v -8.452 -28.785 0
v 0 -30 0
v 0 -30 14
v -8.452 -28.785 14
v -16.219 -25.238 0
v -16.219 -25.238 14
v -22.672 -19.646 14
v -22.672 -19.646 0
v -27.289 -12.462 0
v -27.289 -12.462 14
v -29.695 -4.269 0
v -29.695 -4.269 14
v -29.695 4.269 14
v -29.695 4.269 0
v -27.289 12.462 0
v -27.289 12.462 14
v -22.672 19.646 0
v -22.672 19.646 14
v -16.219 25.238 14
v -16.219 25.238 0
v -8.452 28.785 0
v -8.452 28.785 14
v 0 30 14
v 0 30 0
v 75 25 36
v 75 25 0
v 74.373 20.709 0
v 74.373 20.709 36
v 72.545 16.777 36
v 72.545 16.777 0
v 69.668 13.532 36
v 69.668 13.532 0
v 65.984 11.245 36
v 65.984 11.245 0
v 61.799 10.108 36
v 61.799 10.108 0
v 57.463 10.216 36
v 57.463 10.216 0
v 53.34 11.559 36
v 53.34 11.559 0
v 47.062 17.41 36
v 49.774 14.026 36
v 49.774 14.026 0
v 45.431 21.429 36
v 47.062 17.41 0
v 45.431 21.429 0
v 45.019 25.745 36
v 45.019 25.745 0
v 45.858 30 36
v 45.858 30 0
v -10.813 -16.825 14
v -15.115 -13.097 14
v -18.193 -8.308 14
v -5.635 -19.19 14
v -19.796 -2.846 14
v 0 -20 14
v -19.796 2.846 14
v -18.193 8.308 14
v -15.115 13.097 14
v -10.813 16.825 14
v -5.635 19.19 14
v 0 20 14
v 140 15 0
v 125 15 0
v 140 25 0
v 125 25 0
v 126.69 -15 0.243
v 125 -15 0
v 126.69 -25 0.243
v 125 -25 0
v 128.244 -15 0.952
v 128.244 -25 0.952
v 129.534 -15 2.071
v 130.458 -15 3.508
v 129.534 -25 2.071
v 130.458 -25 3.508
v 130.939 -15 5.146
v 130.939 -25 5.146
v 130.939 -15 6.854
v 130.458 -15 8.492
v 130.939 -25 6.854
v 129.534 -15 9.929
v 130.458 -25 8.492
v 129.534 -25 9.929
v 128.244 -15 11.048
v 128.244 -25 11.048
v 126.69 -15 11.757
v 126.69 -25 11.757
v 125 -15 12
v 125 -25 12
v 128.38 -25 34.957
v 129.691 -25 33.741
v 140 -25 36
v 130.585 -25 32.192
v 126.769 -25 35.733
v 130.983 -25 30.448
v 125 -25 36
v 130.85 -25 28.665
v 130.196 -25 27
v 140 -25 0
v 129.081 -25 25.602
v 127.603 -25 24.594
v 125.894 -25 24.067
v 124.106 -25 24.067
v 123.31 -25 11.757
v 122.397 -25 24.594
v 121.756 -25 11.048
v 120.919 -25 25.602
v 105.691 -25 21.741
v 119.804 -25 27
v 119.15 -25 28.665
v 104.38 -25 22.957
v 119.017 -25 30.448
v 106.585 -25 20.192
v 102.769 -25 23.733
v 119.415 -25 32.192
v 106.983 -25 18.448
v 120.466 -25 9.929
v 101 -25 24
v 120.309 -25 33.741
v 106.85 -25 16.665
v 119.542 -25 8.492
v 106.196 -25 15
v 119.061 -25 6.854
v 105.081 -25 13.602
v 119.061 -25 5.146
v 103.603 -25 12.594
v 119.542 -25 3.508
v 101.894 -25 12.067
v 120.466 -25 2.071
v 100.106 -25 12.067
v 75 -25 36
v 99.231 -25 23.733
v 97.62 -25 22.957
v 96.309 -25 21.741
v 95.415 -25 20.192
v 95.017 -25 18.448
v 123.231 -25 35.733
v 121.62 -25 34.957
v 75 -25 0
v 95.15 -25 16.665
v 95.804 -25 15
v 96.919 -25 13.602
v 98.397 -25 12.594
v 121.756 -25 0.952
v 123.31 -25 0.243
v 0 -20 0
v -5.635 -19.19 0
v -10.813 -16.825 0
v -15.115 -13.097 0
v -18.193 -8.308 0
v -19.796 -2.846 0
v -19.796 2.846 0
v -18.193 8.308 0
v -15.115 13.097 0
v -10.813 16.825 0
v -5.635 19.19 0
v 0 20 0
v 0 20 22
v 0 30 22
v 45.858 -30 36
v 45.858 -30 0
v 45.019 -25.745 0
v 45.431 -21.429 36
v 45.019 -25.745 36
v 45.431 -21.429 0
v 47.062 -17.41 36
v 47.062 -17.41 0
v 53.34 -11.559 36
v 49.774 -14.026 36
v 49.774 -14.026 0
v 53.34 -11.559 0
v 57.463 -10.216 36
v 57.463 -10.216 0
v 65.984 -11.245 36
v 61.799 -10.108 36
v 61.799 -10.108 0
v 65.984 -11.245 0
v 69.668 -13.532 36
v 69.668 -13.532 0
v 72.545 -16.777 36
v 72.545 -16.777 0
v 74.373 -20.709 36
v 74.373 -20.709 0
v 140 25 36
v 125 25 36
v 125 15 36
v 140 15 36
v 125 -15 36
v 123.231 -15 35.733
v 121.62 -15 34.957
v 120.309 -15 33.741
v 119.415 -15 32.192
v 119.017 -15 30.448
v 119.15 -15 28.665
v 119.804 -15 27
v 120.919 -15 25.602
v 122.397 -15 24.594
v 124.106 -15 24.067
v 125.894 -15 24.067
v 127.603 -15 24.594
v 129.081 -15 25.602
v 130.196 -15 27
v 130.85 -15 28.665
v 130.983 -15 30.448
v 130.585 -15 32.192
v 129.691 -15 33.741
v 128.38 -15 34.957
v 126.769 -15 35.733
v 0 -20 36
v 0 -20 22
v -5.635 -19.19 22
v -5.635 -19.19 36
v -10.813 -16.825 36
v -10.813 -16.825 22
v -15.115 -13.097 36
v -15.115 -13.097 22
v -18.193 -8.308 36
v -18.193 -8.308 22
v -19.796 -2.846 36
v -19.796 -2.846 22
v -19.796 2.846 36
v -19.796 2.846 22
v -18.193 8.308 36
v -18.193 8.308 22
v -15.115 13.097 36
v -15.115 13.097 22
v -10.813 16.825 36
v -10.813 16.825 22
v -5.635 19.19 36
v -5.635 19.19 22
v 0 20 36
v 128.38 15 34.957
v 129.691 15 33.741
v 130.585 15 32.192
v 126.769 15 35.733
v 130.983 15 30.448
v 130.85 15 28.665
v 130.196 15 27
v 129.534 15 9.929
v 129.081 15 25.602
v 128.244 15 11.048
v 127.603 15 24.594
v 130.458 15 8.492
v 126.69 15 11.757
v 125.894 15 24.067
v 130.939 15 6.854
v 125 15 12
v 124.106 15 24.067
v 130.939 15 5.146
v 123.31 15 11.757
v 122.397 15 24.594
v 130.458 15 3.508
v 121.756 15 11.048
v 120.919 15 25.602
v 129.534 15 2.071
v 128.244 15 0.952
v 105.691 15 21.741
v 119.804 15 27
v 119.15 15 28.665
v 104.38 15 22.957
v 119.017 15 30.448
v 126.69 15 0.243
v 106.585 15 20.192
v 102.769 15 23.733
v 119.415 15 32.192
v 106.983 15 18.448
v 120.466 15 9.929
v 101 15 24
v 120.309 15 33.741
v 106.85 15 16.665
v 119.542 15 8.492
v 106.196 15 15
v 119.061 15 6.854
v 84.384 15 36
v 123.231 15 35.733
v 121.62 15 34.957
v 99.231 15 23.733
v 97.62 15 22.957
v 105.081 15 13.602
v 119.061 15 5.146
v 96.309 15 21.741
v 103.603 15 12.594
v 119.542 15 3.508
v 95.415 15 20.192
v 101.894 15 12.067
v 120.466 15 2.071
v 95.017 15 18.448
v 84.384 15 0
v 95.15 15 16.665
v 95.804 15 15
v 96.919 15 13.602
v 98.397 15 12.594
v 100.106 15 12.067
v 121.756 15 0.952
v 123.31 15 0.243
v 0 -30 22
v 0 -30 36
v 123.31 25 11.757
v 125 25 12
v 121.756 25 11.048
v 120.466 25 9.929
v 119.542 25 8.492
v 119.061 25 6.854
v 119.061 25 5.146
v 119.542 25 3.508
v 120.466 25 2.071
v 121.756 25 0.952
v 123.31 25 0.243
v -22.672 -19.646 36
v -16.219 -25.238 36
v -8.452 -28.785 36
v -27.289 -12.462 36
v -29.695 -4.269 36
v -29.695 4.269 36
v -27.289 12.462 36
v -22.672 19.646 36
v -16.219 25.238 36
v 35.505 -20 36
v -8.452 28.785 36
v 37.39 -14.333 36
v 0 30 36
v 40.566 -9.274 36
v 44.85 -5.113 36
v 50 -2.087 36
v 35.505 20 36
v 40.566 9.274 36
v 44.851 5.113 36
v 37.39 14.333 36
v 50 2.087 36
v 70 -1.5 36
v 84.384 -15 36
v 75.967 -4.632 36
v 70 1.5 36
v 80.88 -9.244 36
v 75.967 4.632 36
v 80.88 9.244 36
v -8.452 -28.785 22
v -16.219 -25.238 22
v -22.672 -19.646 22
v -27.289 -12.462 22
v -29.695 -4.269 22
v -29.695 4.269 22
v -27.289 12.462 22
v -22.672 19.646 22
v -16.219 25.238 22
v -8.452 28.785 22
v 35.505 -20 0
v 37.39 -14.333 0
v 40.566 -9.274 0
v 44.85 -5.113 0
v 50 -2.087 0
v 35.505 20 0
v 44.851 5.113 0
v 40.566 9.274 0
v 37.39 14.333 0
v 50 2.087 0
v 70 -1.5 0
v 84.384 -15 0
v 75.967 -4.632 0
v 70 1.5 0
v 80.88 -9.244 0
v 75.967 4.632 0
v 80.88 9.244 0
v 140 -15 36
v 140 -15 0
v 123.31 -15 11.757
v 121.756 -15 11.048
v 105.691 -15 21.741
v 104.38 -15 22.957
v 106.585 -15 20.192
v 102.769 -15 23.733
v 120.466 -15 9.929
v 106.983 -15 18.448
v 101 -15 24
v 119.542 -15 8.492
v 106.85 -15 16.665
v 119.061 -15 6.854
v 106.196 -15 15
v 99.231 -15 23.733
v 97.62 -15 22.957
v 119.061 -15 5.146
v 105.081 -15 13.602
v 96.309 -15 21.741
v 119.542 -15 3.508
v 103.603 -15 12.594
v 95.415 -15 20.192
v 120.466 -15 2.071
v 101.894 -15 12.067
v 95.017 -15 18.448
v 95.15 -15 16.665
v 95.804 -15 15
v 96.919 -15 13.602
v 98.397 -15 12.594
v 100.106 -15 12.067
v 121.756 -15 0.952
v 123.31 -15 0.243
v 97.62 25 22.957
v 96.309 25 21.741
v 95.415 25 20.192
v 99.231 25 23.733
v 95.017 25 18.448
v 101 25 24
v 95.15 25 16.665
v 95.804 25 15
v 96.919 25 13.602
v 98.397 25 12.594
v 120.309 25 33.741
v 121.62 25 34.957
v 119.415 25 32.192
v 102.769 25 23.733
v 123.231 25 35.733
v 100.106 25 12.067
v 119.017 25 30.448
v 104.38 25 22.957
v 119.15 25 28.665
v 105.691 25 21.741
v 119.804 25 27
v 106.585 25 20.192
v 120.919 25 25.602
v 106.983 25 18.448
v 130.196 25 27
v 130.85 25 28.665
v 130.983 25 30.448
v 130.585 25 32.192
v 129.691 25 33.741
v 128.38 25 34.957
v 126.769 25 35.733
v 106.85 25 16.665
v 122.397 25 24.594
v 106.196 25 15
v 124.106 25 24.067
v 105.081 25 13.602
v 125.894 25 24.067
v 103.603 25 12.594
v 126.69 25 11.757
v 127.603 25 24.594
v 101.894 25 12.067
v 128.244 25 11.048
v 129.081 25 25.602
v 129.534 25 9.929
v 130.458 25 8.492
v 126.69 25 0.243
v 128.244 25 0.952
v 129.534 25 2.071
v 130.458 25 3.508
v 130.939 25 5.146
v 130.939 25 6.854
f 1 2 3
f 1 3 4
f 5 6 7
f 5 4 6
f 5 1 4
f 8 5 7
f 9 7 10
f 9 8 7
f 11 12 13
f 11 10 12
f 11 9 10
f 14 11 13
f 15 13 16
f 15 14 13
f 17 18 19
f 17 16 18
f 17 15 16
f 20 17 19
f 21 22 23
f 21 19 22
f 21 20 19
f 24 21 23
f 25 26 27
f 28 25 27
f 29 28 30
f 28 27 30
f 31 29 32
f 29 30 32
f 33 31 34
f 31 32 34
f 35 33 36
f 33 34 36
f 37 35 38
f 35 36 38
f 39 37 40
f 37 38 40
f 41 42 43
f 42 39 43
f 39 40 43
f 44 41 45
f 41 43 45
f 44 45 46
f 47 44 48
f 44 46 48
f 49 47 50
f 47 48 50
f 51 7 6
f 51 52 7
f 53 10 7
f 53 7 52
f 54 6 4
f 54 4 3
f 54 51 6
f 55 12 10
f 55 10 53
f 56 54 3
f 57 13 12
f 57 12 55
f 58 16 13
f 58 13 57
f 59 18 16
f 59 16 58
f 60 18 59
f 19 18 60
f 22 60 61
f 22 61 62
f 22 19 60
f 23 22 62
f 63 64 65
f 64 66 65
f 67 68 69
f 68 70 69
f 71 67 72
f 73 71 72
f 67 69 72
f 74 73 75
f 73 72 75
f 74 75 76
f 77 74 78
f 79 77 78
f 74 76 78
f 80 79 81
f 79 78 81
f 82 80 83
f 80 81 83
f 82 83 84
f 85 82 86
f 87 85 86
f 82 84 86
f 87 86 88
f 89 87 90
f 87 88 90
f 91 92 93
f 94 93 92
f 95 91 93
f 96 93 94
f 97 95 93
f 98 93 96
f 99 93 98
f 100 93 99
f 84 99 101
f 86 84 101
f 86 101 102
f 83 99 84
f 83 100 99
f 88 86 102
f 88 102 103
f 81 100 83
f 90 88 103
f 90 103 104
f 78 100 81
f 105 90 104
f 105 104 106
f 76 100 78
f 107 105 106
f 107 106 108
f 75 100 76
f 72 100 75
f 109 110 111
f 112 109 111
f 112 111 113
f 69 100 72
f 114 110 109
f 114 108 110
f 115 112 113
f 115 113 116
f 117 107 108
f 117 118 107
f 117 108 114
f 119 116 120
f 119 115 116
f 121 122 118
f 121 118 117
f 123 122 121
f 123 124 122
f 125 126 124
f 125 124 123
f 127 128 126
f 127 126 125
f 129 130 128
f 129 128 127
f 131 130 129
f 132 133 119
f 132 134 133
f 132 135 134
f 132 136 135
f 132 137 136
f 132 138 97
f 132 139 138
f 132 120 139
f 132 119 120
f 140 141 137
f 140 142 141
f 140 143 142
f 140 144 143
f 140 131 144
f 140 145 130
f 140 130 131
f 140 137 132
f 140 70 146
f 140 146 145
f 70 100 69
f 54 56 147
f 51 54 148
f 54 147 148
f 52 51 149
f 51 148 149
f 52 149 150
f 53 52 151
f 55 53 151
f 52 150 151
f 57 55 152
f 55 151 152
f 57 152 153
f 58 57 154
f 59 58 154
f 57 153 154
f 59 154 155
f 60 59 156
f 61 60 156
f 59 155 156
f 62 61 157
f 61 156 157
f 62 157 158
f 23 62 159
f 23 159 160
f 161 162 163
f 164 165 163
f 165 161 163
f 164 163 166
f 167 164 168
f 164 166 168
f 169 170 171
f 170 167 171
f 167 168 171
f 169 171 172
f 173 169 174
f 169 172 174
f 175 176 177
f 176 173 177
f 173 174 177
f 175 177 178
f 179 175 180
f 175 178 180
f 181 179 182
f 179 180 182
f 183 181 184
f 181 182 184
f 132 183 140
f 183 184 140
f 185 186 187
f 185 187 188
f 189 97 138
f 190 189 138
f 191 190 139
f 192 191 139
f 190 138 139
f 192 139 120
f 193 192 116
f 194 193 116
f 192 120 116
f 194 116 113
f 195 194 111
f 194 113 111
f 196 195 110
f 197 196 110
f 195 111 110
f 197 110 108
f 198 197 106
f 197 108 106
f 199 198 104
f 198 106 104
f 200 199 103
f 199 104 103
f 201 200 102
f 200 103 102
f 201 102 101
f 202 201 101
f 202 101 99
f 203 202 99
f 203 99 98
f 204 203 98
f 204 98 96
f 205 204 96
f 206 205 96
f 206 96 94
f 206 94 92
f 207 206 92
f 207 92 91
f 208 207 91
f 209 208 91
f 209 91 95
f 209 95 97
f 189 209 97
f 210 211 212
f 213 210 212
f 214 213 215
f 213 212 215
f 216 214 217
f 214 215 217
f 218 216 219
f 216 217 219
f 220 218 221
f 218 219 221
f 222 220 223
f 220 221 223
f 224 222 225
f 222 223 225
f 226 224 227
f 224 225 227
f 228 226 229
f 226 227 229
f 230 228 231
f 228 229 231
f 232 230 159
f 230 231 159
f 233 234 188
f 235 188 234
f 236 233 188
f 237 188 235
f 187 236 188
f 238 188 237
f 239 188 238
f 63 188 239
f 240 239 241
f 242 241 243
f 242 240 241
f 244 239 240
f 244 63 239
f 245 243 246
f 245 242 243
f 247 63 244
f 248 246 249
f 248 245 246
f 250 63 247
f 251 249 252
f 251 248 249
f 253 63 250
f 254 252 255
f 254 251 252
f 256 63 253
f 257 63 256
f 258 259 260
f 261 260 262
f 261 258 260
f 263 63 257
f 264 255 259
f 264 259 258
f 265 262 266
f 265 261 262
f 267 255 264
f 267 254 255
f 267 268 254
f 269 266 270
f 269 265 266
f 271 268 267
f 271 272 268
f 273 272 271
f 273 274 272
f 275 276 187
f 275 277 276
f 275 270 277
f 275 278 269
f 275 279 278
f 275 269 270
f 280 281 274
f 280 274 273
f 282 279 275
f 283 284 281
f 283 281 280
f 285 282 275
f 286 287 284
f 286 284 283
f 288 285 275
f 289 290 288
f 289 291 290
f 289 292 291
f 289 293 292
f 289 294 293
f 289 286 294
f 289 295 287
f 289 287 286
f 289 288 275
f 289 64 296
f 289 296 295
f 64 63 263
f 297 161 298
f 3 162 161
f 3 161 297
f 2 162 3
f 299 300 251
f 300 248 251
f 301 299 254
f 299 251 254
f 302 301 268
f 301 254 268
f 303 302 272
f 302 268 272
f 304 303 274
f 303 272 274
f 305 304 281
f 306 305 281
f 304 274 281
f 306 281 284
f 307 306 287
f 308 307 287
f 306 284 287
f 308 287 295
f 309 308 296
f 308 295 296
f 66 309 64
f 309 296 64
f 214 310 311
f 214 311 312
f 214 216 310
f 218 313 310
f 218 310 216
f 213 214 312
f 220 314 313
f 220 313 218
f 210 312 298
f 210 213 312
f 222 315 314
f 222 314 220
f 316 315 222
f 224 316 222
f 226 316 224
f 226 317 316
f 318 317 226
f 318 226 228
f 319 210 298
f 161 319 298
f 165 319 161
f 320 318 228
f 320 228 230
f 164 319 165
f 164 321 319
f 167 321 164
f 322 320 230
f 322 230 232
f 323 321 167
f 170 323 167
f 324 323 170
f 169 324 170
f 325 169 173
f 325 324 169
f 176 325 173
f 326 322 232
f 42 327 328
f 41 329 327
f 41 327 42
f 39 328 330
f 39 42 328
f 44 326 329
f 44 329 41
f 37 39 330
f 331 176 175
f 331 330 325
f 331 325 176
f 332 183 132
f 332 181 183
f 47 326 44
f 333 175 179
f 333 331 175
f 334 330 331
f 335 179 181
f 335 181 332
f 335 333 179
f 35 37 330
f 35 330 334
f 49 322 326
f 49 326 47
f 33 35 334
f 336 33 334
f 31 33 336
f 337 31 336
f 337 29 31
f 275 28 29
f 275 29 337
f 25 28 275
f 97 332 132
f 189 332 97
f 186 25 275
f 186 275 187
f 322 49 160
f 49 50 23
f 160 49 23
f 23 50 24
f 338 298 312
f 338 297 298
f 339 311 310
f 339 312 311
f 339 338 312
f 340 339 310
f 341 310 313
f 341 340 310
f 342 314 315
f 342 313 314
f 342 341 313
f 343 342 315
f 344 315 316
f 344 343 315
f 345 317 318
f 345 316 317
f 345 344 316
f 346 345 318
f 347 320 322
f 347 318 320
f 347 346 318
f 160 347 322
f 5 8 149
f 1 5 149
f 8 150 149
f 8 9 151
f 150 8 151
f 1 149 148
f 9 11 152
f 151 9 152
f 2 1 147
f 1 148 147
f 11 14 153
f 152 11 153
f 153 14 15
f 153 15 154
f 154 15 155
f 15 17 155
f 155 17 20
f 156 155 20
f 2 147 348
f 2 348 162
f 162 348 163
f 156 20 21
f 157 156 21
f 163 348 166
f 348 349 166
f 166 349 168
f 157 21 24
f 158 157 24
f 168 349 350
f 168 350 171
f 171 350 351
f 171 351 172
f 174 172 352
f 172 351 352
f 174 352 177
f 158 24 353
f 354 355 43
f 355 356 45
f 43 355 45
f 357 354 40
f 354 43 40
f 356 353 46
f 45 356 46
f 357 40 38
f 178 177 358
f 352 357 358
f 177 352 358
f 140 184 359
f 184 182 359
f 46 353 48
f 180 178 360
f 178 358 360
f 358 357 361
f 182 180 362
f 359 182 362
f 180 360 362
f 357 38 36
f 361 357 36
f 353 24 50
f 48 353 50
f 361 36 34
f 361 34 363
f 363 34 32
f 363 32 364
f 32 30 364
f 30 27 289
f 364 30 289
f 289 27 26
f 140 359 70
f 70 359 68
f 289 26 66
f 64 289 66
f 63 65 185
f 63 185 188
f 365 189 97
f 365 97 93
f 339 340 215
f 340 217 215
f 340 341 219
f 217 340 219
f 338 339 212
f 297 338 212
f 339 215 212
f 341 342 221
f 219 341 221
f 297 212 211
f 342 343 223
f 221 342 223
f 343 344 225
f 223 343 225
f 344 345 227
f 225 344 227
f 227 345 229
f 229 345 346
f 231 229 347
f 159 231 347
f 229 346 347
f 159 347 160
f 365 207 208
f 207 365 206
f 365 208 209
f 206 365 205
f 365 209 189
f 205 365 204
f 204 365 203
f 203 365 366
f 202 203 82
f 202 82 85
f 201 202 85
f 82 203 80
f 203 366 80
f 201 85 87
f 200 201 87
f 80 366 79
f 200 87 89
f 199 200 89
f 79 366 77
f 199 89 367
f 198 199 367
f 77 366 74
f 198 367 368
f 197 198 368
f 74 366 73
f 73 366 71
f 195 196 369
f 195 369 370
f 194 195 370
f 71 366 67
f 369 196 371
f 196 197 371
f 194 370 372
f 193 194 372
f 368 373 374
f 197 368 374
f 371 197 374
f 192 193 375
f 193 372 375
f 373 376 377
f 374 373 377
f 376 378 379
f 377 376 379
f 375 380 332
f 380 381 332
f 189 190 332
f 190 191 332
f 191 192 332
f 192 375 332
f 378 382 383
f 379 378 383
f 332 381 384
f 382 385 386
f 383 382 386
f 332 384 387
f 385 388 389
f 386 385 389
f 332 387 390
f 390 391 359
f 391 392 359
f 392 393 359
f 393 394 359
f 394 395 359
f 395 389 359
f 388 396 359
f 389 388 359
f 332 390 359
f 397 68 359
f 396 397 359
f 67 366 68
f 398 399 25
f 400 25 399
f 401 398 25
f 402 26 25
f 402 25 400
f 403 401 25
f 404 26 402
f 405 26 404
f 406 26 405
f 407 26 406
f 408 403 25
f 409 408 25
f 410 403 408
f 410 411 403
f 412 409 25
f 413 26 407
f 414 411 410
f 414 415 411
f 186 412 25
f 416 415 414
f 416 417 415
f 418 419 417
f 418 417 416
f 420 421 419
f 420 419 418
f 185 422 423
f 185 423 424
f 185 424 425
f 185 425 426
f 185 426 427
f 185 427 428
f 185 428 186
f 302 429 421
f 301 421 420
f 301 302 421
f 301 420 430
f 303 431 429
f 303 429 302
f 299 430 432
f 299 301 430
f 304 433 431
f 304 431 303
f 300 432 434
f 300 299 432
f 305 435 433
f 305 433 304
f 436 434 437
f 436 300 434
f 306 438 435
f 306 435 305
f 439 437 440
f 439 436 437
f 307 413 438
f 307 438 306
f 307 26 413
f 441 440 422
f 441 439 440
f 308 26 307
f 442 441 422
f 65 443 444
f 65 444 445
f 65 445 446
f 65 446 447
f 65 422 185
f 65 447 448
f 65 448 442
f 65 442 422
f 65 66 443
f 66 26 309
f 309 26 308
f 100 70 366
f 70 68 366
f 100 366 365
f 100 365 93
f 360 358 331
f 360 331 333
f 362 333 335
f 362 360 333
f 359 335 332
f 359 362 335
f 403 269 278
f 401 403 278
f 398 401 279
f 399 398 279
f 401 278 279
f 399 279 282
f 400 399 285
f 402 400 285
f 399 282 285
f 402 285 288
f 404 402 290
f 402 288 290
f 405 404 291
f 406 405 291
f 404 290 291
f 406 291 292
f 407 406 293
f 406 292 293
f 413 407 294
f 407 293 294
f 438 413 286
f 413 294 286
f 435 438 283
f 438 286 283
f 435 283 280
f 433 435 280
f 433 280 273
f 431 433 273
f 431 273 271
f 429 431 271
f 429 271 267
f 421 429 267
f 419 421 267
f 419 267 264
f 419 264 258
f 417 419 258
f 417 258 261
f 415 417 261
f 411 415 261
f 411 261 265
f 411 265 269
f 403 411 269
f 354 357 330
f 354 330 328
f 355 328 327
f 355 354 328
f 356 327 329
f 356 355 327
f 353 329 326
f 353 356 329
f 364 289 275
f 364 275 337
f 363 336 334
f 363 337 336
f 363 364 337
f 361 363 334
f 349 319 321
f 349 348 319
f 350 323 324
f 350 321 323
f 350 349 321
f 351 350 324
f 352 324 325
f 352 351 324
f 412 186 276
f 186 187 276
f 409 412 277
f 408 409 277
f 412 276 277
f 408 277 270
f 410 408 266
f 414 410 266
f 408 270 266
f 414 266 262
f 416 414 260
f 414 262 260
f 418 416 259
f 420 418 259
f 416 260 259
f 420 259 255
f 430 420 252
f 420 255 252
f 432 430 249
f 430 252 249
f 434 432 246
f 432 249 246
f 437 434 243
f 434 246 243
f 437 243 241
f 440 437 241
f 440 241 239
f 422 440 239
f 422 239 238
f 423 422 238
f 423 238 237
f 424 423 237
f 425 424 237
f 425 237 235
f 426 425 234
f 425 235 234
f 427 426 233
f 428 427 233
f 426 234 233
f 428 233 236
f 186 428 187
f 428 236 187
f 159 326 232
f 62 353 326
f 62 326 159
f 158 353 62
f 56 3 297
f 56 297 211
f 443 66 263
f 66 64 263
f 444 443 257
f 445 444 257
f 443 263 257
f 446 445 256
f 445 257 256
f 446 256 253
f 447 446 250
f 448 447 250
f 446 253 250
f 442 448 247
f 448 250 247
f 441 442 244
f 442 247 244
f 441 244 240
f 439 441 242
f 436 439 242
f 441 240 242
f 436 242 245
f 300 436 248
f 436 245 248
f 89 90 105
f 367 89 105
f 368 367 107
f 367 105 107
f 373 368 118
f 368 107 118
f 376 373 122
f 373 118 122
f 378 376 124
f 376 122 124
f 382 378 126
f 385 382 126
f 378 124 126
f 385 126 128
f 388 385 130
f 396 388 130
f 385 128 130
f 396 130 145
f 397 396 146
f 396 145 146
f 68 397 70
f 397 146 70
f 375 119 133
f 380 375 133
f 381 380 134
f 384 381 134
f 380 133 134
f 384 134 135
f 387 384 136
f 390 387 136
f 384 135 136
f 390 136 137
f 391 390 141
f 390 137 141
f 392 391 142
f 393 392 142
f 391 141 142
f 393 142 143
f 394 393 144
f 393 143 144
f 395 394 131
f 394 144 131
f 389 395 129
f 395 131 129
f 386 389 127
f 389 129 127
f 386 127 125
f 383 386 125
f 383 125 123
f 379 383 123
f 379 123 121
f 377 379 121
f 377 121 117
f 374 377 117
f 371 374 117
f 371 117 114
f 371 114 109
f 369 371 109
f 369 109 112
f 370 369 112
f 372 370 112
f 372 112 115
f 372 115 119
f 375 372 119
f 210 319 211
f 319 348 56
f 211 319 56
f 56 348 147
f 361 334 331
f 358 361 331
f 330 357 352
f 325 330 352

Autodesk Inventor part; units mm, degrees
ref_plane "YZ Plane" through (0, 0, 0) normal (1, 0, 0) x (0, 1, 0)
ref_plane "XZ Plane" through (0, 0, 0) normal (0, 1, 0) x (-1, 0, 0)
sketch "Skizze1" plane through (0, 0, 0) normal (0, 0, 1) x (1, 0, 0)
  line L0 (75, 25) -> (140, 25)
  line L1 (140, -25) -> (75, -25)
  line L2 (140, 15) -> (84.3835, 15)
  line L3 (140, -15) -> (84.3835, -15)
  line L4 (175.9728, 0) -> (38.8128, 0) construction
  line L5 (75, 25) -> (75, -25) construction
  arc A0 (70, 1.5) -> (84.3835, 15) centre (61.4706, 25) ccw
  line L6 (70, 1.5) -> (70, -1.5)
  arc A1 (84.3835, -15) -> (70, -1.5) centre (61.4706, -25) ccw
  line L7 (140, 25) -> (140, 15)
  line L8 (140, -15) -> (140, -25)
  arc A2 (45.8579, 30) -> (75, 25) centre (60, 25) ccw
  line L9 (45.8579, 30) -> (0, 30)
  arc A3 (75, -25) -> (45.8579, -30) centre (60, -25) ccw
  line L10 (45.8579, -30) -> (0, -30)
  arc A4 (0, 30) -> (0, -30) centre (0, 0) ccw
  line L11 (50, 2.0871) -> (50, -2.0871)
  line L12 (35.5051, -20) -> (0, -20)
  line L13 (35.5051, 20) -> (0, 20)
  arc A5 (0, 20) -> (0, -20) centre (0, 0) ccw
  line L14 (60, 25) -> (60, -25) construction
  arc A6 (35.5051, 20) -> (50, 2.0871) centre (60, 25) ccw
  arc A7 (50, -2.0871) -> (35.5051, -20) centre (60, -25) ccw
  dimension "d17" = 30
  dimension "d18" = 50
  dimension "d19" = 25
  dimension "d20" = 3
  dimension "d21" = 80
  dimension "d28" = 15
  dimension "d30" = 30
  dimension "d34" = 20
  dimension "d36" = 25
  dimension "d37" = 25
  dimension "d38" = 60
  dimension "d39" = 20
extrude "Extrusion1" add sketch "Skizze1" along normal blind 36
sketch "Skizze2" plane through (75, 25, 0) normal (0, 1, 0) x (1, 0, 0)
  line L0 (65, 0) -> (65, -36) projected
  line L1 (65, 0) -> (0, 0) projected
  point P0 (-75, 0)
  point P1 (50, -6)
  point P2 (50, -30)
  point P3 (26, -18)
  point P4 (65, -18)
  dimension "d42" = 24
  dimension "d43" = 6
  dimension "d44" = 24
  dimension "d45" = 15
hole "Bohrung1" at (125, 25, 6) at (125, 25, 30) at (101, 25, 18) direction (0, -1, 0) diameter 12 depth 50
ref_plane "Arbeitsebene1" through (0, 0, 18) normal (0, 0, 1) x (1, 0, 0)
sketch "Skizze3" plane through (0, 0, 18) normal (0, 0, 1) x (1, 0, 0)
  arc A0 (0, 30) -> (0, -30) centre (0, 0) ccw projected
  arc A1 (0, 30) -> (0, -30) centre (0, 0) ccw
  line L0 (0, -30) -> (0, 30)
  dimension "d54" = 30
extrude "Extrusion2" cut sketch "Skizze3" along normal mid plane 8
equation "\"d37\" = d36"
properties part number "drawing" material "Stahl, galvanisiert"
